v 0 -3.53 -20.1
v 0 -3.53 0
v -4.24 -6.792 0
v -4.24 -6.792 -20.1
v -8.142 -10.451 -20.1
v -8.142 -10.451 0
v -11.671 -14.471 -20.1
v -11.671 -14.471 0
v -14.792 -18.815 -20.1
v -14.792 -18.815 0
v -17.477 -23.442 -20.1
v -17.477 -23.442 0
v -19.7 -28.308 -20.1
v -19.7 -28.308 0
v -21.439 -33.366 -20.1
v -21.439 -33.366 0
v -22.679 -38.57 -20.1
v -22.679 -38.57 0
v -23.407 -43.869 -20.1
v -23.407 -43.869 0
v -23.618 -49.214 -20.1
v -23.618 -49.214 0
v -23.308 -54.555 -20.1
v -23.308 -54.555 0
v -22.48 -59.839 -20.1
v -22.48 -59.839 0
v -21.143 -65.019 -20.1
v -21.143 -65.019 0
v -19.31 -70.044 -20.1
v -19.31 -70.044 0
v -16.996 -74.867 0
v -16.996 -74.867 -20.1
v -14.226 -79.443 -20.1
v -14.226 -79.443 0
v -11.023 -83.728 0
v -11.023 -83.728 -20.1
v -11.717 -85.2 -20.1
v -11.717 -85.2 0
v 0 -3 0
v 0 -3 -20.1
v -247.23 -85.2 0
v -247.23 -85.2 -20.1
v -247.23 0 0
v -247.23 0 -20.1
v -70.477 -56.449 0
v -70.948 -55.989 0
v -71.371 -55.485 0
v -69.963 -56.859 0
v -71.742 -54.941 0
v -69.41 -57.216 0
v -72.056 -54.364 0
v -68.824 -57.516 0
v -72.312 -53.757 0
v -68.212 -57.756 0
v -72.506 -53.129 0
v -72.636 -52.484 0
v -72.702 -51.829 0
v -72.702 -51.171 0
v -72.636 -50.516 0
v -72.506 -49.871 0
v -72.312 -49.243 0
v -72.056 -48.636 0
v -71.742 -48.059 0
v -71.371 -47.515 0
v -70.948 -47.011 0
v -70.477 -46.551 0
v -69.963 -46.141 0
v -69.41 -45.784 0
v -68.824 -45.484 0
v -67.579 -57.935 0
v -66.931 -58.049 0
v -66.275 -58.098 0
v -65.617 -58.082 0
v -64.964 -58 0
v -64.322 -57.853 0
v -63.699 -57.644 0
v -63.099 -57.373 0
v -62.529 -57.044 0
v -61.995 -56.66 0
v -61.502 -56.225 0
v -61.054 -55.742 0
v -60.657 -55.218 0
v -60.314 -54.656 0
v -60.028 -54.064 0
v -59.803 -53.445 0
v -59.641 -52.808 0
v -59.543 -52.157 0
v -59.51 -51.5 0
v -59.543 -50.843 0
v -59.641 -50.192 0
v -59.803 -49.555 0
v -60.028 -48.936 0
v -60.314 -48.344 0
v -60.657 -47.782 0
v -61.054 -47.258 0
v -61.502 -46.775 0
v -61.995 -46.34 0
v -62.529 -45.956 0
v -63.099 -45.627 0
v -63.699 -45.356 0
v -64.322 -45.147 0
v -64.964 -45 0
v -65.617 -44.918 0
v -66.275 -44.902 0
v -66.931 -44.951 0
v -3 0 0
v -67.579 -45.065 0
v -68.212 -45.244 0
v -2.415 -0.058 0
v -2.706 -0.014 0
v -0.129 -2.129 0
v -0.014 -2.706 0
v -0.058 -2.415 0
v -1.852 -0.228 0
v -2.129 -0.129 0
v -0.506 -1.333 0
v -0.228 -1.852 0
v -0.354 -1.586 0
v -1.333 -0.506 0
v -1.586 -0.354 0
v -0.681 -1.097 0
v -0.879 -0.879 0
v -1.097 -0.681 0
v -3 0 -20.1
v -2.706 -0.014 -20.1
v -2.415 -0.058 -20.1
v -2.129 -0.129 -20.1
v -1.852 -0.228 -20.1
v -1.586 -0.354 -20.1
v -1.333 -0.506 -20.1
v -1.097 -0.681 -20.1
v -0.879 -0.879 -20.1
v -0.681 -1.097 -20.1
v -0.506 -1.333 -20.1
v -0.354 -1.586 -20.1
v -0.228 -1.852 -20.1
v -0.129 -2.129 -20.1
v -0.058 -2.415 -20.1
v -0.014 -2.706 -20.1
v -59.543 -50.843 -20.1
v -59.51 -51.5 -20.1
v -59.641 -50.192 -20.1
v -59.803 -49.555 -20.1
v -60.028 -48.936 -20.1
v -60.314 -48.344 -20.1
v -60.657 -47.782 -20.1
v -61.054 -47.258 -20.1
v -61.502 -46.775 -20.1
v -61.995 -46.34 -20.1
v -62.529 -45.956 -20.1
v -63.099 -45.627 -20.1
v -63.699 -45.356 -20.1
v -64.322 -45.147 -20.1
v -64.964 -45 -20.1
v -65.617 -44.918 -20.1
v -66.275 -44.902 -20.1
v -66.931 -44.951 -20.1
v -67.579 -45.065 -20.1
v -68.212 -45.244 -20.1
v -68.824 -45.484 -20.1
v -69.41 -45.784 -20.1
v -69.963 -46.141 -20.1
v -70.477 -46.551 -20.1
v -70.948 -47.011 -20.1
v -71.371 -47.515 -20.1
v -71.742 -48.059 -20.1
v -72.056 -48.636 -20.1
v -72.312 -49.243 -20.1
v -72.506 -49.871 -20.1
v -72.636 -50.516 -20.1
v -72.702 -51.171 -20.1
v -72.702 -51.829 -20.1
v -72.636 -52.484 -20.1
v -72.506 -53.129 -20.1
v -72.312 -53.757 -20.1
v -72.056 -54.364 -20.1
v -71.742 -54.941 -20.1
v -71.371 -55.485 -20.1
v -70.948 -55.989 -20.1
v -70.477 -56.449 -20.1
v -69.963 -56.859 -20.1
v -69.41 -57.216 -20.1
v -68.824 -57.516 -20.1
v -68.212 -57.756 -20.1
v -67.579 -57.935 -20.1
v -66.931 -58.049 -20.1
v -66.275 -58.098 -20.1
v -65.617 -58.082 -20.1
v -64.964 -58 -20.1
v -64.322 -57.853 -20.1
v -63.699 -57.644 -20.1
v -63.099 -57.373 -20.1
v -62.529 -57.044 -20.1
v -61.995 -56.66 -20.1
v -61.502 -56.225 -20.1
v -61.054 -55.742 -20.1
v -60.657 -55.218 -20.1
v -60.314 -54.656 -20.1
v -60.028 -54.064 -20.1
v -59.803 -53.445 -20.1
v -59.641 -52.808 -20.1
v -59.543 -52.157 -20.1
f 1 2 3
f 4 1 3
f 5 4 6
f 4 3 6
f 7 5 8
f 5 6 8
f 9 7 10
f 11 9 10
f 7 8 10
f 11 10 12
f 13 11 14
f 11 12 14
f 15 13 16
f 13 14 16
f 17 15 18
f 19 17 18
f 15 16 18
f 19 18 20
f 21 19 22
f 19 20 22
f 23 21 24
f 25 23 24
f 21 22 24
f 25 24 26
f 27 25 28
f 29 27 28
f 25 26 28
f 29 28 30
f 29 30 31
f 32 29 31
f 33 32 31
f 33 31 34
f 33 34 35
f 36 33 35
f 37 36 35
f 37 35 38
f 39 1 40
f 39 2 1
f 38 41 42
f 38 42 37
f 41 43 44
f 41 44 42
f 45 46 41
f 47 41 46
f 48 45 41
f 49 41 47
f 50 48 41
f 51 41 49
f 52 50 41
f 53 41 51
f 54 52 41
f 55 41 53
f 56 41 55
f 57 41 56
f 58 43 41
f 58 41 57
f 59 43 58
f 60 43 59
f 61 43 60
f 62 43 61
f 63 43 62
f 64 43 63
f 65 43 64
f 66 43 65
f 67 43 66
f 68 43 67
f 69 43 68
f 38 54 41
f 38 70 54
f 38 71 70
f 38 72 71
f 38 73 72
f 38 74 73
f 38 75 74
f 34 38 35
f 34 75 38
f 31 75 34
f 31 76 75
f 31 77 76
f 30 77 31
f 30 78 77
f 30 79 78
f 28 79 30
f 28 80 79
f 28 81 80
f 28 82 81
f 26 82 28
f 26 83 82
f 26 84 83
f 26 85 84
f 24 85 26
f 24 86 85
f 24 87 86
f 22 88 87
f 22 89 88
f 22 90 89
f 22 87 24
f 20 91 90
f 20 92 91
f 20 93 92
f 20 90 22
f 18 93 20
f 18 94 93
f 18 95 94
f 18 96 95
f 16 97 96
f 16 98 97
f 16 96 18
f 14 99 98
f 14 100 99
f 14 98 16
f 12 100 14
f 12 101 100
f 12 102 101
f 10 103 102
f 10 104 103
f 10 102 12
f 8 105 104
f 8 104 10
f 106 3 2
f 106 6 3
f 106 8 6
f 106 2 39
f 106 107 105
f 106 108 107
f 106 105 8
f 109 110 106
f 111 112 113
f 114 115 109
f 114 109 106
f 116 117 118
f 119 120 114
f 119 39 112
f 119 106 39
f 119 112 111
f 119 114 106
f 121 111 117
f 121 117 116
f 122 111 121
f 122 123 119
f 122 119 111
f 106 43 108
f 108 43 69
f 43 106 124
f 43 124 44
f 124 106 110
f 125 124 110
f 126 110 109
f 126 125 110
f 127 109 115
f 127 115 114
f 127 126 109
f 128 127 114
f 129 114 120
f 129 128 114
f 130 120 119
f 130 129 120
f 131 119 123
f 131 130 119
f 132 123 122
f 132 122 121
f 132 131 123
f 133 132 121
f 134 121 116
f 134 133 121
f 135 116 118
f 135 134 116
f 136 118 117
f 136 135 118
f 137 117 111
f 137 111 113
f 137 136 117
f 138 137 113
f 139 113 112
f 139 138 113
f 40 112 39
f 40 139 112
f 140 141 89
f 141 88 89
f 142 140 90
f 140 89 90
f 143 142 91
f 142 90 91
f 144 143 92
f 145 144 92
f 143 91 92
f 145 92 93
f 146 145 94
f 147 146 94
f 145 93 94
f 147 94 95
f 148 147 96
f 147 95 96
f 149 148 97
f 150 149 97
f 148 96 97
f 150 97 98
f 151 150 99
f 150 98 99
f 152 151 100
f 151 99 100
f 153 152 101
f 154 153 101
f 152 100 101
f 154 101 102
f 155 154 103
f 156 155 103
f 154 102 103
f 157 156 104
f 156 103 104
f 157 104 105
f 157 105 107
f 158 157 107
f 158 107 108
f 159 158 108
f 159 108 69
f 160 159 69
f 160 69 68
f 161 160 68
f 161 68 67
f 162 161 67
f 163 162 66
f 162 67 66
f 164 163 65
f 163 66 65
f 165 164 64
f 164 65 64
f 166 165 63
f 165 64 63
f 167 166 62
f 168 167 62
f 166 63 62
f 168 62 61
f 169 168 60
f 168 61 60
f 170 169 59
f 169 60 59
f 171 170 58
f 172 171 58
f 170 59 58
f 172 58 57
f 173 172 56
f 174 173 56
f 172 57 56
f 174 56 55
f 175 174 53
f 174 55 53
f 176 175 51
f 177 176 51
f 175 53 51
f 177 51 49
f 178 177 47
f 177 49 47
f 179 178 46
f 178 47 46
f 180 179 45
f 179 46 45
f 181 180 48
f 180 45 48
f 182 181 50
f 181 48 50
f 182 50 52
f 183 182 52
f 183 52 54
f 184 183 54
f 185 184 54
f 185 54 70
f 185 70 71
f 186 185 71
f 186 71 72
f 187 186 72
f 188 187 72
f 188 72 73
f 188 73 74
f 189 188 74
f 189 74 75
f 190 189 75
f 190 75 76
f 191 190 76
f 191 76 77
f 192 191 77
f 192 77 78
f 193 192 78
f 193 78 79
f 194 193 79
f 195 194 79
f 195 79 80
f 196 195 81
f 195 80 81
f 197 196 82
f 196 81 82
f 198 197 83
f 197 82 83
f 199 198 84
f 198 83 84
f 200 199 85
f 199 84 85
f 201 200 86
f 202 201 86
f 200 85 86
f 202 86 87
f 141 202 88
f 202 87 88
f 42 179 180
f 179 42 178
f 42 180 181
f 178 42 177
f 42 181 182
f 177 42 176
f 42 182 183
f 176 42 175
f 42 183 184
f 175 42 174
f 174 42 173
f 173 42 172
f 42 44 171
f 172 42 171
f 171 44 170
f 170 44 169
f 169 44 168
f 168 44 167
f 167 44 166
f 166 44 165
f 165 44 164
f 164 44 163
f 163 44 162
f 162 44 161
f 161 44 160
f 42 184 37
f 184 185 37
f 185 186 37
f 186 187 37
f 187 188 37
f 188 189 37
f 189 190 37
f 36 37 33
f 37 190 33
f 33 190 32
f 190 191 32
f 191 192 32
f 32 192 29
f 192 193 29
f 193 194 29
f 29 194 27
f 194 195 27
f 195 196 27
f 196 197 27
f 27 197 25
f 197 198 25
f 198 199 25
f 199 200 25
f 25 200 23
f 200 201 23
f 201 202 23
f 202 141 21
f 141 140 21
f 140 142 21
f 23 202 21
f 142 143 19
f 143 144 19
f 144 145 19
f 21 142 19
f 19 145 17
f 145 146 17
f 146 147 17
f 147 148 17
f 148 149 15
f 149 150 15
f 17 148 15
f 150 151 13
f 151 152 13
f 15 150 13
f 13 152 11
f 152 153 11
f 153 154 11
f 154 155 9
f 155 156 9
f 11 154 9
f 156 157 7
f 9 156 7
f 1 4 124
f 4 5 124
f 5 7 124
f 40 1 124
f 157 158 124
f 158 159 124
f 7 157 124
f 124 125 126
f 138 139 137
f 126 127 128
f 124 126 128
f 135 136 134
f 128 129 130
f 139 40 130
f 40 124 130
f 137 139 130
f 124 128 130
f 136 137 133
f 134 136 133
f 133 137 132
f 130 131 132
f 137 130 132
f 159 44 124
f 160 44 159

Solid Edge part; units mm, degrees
sketch "Sketch1" plane through (0, 0, 0) normal (0, 0, 1) x (1, 0, 0)
  line L0 (0, 0) -> (-247.23, 0)
  line L1 (-247.23, 0) -> (-247.23, -85.2)
  line L2 (-247.23, -85.2) -> (0, -85.2)
  line L3 (0, -85.2) -> (0, 0)
extrude "Protrusion1" add sketch "Sketch1" against normal blind 20.1
sketch "Sketch2" plane through (-123.615, -42.6, 0) normal (0, 0, 1) x (1, 0, 0)
  circle A0 centre (154.995, -6.1) radius 55
extrude "ExtrudedCutout_1" cut sketch "Sketch2" against normal blind 21
fillet "Round_1" radius 3 1 edges at (0, 0, -10.05)
chamfer "Chamfer_1" distance 2 angle 45 1 edges at (-9.763, -85.2, -10.05)
sketch "Sketch3" plane through (-123.615, -42.6, 0) normal (0, 0, 1) x (1, 0, 0)
  circle A0 centre (57.505, -8.9) radius 6.6
extrude "ExtrudedCutout_2" cut sketch "Sketch3" against normal blind 22
